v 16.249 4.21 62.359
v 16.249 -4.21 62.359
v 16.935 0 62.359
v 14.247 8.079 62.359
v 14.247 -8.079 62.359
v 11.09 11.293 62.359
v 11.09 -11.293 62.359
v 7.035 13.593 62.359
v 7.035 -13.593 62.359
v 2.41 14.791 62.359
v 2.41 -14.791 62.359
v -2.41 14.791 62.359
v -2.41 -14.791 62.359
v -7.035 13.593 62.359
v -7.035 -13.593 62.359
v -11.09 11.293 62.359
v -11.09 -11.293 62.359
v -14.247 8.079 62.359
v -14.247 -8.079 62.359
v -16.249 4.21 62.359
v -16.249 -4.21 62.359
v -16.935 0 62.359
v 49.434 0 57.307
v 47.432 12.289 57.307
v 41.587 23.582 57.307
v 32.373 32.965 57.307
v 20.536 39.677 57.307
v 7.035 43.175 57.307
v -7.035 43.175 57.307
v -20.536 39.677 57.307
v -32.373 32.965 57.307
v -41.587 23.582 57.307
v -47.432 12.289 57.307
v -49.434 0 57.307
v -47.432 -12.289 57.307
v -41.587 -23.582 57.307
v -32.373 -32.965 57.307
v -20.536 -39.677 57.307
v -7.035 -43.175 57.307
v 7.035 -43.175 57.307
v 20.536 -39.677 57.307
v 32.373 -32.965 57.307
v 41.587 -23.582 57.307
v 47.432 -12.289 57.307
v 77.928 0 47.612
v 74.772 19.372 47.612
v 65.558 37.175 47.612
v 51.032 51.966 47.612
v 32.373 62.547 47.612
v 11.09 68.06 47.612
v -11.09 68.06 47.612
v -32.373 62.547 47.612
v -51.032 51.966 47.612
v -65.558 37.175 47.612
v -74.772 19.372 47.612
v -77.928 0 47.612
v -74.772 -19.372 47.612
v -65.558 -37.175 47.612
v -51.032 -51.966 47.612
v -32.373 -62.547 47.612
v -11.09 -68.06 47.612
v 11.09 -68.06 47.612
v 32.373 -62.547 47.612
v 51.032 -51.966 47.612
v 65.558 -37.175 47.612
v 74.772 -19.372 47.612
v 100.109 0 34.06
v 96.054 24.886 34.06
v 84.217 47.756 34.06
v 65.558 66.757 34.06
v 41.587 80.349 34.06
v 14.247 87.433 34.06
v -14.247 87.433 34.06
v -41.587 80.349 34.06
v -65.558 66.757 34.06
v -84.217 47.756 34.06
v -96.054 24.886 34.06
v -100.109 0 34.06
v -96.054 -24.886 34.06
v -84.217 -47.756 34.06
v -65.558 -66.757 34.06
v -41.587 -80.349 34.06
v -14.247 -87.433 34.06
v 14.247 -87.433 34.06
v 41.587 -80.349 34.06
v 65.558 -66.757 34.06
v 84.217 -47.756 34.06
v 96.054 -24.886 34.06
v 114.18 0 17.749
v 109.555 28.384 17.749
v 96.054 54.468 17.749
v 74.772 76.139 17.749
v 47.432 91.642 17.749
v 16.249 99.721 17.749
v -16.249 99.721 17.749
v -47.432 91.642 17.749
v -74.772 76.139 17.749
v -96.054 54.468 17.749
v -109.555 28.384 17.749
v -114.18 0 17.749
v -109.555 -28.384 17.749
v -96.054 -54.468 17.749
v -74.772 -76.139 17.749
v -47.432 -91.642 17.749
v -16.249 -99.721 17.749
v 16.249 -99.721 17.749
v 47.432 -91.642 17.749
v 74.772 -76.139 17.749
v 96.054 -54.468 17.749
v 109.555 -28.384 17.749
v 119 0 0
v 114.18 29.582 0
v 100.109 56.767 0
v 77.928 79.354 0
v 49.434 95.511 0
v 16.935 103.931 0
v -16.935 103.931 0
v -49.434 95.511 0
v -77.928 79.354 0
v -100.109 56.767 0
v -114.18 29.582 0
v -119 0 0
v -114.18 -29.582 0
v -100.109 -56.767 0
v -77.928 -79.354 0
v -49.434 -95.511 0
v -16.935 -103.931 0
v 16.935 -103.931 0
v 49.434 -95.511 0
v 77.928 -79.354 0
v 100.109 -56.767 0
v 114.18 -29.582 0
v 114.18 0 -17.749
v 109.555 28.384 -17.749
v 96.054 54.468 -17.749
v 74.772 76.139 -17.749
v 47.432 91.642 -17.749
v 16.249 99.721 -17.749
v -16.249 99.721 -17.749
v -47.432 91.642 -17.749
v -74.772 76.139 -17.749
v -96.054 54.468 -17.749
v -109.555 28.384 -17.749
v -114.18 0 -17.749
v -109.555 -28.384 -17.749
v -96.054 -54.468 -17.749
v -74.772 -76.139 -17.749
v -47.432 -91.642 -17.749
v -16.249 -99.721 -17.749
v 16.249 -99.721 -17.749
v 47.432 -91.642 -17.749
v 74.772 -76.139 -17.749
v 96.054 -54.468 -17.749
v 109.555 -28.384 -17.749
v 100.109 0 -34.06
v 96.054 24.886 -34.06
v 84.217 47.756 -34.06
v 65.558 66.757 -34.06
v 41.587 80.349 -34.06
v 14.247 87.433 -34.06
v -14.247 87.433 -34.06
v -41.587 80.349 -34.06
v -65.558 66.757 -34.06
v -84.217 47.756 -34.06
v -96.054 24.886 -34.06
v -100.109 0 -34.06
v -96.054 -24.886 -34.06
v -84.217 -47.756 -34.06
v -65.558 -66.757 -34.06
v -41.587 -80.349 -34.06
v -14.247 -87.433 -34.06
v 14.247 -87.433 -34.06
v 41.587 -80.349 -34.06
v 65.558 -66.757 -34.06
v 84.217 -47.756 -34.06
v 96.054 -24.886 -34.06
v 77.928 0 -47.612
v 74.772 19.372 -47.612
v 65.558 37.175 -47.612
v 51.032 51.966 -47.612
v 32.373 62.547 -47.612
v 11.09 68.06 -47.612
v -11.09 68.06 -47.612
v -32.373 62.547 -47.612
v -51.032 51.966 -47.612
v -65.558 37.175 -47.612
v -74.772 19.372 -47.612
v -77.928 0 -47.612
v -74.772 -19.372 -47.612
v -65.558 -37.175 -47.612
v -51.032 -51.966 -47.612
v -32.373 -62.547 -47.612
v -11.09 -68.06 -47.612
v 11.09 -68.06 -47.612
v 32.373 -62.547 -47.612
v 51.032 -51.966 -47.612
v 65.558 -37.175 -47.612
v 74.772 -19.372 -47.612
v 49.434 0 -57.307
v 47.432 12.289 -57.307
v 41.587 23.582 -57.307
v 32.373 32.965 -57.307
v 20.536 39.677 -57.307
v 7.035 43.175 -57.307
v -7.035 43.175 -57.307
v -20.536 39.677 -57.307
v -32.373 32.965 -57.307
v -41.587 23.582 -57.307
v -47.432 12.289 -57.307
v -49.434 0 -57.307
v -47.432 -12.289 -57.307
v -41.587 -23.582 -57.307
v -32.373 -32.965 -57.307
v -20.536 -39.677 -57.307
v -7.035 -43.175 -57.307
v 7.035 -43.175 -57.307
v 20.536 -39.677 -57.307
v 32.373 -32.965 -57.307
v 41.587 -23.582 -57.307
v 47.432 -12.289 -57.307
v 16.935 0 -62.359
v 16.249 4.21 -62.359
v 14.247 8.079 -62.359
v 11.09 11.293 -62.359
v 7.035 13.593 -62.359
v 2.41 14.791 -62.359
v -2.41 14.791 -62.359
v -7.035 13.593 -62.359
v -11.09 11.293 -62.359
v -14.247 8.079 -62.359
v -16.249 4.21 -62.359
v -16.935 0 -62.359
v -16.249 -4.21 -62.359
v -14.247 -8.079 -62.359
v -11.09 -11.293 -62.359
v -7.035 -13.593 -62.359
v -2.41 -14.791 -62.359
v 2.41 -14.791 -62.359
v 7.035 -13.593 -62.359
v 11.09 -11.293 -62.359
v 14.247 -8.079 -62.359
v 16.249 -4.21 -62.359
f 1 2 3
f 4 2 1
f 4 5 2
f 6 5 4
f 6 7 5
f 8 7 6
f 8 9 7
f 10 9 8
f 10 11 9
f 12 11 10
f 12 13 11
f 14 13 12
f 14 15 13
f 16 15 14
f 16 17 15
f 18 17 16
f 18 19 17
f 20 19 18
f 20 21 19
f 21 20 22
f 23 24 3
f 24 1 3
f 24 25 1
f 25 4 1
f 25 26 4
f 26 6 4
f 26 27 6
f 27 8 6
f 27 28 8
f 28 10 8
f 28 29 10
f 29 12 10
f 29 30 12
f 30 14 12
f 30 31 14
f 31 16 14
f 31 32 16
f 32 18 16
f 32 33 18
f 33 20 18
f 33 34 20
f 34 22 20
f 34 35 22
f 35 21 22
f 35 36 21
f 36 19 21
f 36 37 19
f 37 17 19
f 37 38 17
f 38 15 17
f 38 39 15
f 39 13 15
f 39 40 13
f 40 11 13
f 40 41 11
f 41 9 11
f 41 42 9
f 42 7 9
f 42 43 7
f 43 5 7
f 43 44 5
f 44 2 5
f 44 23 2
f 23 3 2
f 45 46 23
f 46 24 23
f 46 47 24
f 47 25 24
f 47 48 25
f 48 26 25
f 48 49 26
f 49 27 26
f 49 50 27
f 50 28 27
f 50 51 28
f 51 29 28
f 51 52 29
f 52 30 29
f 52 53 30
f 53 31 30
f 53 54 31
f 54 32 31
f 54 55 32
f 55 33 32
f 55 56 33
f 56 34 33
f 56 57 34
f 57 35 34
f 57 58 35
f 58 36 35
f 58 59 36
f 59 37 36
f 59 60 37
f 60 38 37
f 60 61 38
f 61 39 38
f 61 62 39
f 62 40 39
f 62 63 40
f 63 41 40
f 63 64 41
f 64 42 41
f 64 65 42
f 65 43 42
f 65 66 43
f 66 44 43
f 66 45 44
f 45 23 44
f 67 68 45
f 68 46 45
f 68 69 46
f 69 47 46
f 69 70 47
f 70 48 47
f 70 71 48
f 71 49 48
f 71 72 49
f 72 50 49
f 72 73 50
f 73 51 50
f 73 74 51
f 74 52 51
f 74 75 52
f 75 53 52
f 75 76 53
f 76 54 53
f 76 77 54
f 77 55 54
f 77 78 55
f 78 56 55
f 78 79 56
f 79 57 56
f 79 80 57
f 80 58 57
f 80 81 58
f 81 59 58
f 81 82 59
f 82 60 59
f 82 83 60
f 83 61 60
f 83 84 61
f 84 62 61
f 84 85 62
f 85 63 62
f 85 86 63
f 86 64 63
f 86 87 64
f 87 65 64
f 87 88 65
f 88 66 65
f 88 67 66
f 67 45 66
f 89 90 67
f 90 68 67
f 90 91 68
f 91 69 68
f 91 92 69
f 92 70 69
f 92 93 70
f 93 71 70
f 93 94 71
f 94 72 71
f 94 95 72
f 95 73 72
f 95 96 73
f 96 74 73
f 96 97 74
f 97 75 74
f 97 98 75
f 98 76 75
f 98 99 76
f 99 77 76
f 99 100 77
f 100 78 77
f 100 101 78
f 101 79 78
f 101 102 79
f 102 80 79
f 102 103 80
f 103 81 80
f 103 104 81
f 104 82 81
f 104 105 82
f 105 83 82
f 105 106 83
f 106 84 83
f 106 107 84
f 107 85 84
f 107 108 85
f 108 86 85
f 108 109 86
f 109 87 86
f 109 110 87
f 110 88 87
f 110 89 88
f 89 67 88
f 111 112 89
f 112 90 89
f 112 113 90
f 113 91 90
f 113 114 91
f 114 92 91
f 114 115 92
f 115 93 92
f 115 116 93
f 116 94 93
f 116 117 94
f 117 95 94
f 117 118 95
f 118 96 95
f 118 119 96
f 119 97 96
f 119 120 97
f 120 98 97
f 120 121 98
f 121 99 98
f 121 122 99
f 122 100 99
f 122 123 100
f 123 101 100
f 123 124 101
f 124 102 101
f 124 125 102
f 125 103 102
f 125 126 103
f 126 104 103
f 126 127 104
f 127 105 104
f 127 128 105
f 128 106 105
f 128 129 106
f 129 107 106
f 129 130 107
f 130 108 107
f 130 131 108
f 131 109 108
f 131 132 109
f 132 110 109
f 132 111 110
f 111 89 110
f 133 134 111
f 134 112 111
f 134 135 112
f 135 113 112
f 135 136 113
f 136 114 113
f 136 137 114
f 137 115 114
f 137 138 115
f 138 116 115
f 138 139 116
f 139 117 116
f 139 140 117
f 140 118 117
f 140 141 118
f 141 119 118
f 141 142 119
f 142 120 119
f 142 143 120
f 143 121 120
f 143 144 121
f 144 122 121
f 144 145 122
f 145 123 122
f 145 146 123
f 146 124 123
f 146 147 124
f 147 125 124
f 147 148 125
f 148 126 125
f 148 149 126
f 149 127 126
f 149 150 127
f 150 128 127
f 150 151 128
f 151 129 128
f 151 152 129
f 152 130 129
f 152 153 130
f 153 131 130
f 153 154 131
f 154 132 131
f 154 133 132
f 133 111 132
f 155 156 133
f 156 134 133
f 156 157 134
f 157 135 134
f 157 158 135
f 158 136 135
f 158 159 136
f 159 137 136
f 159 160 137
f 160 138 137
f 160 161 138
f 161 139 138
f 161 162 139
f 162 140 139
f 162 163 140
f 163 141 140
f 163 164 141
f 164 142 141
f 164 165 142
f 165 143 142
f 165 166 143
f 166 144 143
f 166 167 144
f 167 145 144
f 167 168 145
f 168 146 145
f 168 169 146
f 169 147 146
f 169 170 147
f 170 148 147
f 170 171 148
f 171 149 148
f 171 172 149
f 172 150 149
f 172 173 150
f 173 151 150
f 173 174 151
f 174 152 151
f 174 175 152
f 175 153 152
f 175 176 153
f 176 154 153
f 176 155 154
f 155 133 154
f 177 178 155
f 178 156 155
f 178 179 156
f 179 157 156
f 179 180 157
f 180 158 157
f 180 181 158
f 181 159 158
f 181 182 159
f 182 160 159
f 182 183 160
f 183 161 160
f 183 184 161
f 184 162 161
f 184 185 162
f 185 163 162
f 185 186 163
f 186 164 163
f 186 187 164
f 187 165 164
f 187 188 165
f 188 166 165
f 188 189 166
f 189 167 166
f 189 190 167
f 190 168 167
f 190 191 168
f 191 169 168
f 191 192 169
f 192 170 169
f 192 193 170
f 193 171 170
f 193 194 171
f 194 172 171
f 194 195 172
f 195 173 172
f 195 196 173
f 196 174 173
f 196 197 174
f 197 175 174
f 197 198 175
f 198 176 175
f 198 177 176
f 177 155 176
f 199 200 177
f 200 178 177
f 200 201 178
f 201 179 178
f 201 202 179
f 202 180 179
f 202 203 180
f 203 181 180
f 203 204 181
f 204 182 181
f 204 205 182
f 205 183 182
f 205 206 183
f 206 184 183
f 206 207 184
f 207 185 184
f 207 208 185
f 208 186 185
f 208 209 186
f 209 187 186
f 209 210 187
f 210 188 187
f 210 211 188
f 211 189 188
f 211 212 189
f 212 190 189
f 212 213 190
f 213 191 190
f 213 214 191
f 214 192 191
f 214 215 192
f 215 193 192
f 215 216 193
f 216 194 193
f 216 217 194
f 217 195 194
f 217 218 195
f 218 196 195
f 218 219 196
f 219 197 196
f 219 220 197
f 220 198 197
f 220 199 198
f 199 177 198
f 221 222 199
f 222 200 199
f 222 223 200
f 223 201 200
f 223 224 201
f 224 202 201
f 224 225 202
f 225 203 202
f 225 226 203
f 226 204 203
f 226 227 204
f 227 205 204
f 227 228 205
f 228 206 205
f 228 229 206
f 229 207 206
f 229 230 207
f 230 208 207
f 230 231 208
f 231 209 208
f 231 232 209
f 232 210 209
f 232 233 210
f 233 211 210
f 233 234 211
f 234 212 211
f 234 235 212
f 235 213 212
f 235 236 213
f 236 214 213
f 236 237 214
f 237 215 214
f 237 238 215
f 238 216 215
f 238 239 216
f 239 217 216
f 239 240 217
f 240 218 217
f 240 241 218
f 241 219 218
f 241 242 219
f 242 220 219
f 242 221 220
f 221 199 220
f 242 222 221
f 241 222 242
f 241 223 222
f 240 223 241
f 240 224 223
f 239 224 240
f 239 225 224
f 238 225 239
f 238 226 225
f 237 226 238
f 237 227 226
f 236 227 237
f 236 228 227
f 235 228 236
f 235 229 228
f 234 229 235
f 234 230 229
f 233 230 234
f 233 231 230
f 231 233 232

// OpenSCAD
// Generated by SolidPython 1.0.1 on 2020-07-29 00:46:53


scale(v = [17, 15, 9]) {
	sphere(r = 7);
}
/***********************************************
*********      SolidPython code:      **********
************************************************
 
# import packages: SolidPython
from solid import *
from solid.utils import *
from itertools import chain, combinations, permutations


class Resize:

    def __init__(self, scad_file):
        self.scad_file = scad_file
        #self.scad_file = import_scad(scad_file)
        # cone/cylinder param:
        self.r1 = 0
        self.r2 = 0
        self.h = 0
        # rectangular prism param:
        self.w = 0
        self.l = 0
        # ellipse param:
        self.r = 0

    # import OpenScad code (file name corresponds to shape)


    # classify shape + parameters
    def assign(self, param1, param2, param3):
        if self.scad_file == 'cone.scad':
            self.r1 = param1
            self.r2 = param2
            self.h = param3
        elif self.scad_file == 'cylinder.scad':
            self.r1 = param1
            self.r2 = param2
            self.h = param3
        elif self.scad_file == 'rectangularPrism.scad':
            self.h = param1
            self.l = param2
            self.w = param3
        else:
            self.r = param1
            self.h = param2

    # resize parameters
    def iterate(self):
        x = range(3, 20, 2)
        i = 1
        if self.scad_file == 'cone.scad':
            tempList = list(permutations(x, 2))
            for temp in tempList:
                param1 = temp[0]
                param2 = temp[1]
                filepath = 'produced_scad_files/' + 'cone' + str(param1) + '_' + str(param2) + '_' + '.scad'
                scad_render_to_file(cylinder(h=param1, r1=param2, r2=0), filepath)

        elif self.scad_file == 'cylinder.scad':
            tempList = list(permutations(x, 3))
            for temp in tempList:
                param1 = temp[0]
                param2 = temp[1]
                filepath = 'produced_scad_files/' + 'cylinder' + str(param1) + '_' + str(param2) + '_' + '.scad'
                scad_render_to_file(cylinder(h=param1, r1=param2, r2=param2), filepath)

        elif self.scad_file == 'rectangularPrism.scad':
            tempList = list(permutations(x, 3))
            for temp in tempList:
                param1 = temp[0]
                param2 = temp[1]
                param3 = temp[2]
                filepath = 'produced_scad_files/' + 'rectangularPrism' + str(param1) + '_' + str(param2) + '_' + str(
                    param3) + '.scad'
                scad_render_to_file(cube(size=(param1, param2, param3)), filepath)

        elif self.scad_file == 'ellipse.scad':
            tempList = list(permutations(x, 4))
            for temp in tempList:
                param1 = temp[0]
                param2 = temp[1]
                param3 = temp[2]
                param4 = temp[3]
                filepath = 'produced_scad_files/' + 'ellipse' + str(param1) + '_' + str(param2) + '_' + str(param3) + '_' + str(param4) + '.scad'
                scad_render_to_file(scale([param1, param2, param3])(sphere(r=param4)), filepath)

    def render_to_scadfile(self):
        scad_render_to_file(scad, 'example.scad') 
 
************************************************/
